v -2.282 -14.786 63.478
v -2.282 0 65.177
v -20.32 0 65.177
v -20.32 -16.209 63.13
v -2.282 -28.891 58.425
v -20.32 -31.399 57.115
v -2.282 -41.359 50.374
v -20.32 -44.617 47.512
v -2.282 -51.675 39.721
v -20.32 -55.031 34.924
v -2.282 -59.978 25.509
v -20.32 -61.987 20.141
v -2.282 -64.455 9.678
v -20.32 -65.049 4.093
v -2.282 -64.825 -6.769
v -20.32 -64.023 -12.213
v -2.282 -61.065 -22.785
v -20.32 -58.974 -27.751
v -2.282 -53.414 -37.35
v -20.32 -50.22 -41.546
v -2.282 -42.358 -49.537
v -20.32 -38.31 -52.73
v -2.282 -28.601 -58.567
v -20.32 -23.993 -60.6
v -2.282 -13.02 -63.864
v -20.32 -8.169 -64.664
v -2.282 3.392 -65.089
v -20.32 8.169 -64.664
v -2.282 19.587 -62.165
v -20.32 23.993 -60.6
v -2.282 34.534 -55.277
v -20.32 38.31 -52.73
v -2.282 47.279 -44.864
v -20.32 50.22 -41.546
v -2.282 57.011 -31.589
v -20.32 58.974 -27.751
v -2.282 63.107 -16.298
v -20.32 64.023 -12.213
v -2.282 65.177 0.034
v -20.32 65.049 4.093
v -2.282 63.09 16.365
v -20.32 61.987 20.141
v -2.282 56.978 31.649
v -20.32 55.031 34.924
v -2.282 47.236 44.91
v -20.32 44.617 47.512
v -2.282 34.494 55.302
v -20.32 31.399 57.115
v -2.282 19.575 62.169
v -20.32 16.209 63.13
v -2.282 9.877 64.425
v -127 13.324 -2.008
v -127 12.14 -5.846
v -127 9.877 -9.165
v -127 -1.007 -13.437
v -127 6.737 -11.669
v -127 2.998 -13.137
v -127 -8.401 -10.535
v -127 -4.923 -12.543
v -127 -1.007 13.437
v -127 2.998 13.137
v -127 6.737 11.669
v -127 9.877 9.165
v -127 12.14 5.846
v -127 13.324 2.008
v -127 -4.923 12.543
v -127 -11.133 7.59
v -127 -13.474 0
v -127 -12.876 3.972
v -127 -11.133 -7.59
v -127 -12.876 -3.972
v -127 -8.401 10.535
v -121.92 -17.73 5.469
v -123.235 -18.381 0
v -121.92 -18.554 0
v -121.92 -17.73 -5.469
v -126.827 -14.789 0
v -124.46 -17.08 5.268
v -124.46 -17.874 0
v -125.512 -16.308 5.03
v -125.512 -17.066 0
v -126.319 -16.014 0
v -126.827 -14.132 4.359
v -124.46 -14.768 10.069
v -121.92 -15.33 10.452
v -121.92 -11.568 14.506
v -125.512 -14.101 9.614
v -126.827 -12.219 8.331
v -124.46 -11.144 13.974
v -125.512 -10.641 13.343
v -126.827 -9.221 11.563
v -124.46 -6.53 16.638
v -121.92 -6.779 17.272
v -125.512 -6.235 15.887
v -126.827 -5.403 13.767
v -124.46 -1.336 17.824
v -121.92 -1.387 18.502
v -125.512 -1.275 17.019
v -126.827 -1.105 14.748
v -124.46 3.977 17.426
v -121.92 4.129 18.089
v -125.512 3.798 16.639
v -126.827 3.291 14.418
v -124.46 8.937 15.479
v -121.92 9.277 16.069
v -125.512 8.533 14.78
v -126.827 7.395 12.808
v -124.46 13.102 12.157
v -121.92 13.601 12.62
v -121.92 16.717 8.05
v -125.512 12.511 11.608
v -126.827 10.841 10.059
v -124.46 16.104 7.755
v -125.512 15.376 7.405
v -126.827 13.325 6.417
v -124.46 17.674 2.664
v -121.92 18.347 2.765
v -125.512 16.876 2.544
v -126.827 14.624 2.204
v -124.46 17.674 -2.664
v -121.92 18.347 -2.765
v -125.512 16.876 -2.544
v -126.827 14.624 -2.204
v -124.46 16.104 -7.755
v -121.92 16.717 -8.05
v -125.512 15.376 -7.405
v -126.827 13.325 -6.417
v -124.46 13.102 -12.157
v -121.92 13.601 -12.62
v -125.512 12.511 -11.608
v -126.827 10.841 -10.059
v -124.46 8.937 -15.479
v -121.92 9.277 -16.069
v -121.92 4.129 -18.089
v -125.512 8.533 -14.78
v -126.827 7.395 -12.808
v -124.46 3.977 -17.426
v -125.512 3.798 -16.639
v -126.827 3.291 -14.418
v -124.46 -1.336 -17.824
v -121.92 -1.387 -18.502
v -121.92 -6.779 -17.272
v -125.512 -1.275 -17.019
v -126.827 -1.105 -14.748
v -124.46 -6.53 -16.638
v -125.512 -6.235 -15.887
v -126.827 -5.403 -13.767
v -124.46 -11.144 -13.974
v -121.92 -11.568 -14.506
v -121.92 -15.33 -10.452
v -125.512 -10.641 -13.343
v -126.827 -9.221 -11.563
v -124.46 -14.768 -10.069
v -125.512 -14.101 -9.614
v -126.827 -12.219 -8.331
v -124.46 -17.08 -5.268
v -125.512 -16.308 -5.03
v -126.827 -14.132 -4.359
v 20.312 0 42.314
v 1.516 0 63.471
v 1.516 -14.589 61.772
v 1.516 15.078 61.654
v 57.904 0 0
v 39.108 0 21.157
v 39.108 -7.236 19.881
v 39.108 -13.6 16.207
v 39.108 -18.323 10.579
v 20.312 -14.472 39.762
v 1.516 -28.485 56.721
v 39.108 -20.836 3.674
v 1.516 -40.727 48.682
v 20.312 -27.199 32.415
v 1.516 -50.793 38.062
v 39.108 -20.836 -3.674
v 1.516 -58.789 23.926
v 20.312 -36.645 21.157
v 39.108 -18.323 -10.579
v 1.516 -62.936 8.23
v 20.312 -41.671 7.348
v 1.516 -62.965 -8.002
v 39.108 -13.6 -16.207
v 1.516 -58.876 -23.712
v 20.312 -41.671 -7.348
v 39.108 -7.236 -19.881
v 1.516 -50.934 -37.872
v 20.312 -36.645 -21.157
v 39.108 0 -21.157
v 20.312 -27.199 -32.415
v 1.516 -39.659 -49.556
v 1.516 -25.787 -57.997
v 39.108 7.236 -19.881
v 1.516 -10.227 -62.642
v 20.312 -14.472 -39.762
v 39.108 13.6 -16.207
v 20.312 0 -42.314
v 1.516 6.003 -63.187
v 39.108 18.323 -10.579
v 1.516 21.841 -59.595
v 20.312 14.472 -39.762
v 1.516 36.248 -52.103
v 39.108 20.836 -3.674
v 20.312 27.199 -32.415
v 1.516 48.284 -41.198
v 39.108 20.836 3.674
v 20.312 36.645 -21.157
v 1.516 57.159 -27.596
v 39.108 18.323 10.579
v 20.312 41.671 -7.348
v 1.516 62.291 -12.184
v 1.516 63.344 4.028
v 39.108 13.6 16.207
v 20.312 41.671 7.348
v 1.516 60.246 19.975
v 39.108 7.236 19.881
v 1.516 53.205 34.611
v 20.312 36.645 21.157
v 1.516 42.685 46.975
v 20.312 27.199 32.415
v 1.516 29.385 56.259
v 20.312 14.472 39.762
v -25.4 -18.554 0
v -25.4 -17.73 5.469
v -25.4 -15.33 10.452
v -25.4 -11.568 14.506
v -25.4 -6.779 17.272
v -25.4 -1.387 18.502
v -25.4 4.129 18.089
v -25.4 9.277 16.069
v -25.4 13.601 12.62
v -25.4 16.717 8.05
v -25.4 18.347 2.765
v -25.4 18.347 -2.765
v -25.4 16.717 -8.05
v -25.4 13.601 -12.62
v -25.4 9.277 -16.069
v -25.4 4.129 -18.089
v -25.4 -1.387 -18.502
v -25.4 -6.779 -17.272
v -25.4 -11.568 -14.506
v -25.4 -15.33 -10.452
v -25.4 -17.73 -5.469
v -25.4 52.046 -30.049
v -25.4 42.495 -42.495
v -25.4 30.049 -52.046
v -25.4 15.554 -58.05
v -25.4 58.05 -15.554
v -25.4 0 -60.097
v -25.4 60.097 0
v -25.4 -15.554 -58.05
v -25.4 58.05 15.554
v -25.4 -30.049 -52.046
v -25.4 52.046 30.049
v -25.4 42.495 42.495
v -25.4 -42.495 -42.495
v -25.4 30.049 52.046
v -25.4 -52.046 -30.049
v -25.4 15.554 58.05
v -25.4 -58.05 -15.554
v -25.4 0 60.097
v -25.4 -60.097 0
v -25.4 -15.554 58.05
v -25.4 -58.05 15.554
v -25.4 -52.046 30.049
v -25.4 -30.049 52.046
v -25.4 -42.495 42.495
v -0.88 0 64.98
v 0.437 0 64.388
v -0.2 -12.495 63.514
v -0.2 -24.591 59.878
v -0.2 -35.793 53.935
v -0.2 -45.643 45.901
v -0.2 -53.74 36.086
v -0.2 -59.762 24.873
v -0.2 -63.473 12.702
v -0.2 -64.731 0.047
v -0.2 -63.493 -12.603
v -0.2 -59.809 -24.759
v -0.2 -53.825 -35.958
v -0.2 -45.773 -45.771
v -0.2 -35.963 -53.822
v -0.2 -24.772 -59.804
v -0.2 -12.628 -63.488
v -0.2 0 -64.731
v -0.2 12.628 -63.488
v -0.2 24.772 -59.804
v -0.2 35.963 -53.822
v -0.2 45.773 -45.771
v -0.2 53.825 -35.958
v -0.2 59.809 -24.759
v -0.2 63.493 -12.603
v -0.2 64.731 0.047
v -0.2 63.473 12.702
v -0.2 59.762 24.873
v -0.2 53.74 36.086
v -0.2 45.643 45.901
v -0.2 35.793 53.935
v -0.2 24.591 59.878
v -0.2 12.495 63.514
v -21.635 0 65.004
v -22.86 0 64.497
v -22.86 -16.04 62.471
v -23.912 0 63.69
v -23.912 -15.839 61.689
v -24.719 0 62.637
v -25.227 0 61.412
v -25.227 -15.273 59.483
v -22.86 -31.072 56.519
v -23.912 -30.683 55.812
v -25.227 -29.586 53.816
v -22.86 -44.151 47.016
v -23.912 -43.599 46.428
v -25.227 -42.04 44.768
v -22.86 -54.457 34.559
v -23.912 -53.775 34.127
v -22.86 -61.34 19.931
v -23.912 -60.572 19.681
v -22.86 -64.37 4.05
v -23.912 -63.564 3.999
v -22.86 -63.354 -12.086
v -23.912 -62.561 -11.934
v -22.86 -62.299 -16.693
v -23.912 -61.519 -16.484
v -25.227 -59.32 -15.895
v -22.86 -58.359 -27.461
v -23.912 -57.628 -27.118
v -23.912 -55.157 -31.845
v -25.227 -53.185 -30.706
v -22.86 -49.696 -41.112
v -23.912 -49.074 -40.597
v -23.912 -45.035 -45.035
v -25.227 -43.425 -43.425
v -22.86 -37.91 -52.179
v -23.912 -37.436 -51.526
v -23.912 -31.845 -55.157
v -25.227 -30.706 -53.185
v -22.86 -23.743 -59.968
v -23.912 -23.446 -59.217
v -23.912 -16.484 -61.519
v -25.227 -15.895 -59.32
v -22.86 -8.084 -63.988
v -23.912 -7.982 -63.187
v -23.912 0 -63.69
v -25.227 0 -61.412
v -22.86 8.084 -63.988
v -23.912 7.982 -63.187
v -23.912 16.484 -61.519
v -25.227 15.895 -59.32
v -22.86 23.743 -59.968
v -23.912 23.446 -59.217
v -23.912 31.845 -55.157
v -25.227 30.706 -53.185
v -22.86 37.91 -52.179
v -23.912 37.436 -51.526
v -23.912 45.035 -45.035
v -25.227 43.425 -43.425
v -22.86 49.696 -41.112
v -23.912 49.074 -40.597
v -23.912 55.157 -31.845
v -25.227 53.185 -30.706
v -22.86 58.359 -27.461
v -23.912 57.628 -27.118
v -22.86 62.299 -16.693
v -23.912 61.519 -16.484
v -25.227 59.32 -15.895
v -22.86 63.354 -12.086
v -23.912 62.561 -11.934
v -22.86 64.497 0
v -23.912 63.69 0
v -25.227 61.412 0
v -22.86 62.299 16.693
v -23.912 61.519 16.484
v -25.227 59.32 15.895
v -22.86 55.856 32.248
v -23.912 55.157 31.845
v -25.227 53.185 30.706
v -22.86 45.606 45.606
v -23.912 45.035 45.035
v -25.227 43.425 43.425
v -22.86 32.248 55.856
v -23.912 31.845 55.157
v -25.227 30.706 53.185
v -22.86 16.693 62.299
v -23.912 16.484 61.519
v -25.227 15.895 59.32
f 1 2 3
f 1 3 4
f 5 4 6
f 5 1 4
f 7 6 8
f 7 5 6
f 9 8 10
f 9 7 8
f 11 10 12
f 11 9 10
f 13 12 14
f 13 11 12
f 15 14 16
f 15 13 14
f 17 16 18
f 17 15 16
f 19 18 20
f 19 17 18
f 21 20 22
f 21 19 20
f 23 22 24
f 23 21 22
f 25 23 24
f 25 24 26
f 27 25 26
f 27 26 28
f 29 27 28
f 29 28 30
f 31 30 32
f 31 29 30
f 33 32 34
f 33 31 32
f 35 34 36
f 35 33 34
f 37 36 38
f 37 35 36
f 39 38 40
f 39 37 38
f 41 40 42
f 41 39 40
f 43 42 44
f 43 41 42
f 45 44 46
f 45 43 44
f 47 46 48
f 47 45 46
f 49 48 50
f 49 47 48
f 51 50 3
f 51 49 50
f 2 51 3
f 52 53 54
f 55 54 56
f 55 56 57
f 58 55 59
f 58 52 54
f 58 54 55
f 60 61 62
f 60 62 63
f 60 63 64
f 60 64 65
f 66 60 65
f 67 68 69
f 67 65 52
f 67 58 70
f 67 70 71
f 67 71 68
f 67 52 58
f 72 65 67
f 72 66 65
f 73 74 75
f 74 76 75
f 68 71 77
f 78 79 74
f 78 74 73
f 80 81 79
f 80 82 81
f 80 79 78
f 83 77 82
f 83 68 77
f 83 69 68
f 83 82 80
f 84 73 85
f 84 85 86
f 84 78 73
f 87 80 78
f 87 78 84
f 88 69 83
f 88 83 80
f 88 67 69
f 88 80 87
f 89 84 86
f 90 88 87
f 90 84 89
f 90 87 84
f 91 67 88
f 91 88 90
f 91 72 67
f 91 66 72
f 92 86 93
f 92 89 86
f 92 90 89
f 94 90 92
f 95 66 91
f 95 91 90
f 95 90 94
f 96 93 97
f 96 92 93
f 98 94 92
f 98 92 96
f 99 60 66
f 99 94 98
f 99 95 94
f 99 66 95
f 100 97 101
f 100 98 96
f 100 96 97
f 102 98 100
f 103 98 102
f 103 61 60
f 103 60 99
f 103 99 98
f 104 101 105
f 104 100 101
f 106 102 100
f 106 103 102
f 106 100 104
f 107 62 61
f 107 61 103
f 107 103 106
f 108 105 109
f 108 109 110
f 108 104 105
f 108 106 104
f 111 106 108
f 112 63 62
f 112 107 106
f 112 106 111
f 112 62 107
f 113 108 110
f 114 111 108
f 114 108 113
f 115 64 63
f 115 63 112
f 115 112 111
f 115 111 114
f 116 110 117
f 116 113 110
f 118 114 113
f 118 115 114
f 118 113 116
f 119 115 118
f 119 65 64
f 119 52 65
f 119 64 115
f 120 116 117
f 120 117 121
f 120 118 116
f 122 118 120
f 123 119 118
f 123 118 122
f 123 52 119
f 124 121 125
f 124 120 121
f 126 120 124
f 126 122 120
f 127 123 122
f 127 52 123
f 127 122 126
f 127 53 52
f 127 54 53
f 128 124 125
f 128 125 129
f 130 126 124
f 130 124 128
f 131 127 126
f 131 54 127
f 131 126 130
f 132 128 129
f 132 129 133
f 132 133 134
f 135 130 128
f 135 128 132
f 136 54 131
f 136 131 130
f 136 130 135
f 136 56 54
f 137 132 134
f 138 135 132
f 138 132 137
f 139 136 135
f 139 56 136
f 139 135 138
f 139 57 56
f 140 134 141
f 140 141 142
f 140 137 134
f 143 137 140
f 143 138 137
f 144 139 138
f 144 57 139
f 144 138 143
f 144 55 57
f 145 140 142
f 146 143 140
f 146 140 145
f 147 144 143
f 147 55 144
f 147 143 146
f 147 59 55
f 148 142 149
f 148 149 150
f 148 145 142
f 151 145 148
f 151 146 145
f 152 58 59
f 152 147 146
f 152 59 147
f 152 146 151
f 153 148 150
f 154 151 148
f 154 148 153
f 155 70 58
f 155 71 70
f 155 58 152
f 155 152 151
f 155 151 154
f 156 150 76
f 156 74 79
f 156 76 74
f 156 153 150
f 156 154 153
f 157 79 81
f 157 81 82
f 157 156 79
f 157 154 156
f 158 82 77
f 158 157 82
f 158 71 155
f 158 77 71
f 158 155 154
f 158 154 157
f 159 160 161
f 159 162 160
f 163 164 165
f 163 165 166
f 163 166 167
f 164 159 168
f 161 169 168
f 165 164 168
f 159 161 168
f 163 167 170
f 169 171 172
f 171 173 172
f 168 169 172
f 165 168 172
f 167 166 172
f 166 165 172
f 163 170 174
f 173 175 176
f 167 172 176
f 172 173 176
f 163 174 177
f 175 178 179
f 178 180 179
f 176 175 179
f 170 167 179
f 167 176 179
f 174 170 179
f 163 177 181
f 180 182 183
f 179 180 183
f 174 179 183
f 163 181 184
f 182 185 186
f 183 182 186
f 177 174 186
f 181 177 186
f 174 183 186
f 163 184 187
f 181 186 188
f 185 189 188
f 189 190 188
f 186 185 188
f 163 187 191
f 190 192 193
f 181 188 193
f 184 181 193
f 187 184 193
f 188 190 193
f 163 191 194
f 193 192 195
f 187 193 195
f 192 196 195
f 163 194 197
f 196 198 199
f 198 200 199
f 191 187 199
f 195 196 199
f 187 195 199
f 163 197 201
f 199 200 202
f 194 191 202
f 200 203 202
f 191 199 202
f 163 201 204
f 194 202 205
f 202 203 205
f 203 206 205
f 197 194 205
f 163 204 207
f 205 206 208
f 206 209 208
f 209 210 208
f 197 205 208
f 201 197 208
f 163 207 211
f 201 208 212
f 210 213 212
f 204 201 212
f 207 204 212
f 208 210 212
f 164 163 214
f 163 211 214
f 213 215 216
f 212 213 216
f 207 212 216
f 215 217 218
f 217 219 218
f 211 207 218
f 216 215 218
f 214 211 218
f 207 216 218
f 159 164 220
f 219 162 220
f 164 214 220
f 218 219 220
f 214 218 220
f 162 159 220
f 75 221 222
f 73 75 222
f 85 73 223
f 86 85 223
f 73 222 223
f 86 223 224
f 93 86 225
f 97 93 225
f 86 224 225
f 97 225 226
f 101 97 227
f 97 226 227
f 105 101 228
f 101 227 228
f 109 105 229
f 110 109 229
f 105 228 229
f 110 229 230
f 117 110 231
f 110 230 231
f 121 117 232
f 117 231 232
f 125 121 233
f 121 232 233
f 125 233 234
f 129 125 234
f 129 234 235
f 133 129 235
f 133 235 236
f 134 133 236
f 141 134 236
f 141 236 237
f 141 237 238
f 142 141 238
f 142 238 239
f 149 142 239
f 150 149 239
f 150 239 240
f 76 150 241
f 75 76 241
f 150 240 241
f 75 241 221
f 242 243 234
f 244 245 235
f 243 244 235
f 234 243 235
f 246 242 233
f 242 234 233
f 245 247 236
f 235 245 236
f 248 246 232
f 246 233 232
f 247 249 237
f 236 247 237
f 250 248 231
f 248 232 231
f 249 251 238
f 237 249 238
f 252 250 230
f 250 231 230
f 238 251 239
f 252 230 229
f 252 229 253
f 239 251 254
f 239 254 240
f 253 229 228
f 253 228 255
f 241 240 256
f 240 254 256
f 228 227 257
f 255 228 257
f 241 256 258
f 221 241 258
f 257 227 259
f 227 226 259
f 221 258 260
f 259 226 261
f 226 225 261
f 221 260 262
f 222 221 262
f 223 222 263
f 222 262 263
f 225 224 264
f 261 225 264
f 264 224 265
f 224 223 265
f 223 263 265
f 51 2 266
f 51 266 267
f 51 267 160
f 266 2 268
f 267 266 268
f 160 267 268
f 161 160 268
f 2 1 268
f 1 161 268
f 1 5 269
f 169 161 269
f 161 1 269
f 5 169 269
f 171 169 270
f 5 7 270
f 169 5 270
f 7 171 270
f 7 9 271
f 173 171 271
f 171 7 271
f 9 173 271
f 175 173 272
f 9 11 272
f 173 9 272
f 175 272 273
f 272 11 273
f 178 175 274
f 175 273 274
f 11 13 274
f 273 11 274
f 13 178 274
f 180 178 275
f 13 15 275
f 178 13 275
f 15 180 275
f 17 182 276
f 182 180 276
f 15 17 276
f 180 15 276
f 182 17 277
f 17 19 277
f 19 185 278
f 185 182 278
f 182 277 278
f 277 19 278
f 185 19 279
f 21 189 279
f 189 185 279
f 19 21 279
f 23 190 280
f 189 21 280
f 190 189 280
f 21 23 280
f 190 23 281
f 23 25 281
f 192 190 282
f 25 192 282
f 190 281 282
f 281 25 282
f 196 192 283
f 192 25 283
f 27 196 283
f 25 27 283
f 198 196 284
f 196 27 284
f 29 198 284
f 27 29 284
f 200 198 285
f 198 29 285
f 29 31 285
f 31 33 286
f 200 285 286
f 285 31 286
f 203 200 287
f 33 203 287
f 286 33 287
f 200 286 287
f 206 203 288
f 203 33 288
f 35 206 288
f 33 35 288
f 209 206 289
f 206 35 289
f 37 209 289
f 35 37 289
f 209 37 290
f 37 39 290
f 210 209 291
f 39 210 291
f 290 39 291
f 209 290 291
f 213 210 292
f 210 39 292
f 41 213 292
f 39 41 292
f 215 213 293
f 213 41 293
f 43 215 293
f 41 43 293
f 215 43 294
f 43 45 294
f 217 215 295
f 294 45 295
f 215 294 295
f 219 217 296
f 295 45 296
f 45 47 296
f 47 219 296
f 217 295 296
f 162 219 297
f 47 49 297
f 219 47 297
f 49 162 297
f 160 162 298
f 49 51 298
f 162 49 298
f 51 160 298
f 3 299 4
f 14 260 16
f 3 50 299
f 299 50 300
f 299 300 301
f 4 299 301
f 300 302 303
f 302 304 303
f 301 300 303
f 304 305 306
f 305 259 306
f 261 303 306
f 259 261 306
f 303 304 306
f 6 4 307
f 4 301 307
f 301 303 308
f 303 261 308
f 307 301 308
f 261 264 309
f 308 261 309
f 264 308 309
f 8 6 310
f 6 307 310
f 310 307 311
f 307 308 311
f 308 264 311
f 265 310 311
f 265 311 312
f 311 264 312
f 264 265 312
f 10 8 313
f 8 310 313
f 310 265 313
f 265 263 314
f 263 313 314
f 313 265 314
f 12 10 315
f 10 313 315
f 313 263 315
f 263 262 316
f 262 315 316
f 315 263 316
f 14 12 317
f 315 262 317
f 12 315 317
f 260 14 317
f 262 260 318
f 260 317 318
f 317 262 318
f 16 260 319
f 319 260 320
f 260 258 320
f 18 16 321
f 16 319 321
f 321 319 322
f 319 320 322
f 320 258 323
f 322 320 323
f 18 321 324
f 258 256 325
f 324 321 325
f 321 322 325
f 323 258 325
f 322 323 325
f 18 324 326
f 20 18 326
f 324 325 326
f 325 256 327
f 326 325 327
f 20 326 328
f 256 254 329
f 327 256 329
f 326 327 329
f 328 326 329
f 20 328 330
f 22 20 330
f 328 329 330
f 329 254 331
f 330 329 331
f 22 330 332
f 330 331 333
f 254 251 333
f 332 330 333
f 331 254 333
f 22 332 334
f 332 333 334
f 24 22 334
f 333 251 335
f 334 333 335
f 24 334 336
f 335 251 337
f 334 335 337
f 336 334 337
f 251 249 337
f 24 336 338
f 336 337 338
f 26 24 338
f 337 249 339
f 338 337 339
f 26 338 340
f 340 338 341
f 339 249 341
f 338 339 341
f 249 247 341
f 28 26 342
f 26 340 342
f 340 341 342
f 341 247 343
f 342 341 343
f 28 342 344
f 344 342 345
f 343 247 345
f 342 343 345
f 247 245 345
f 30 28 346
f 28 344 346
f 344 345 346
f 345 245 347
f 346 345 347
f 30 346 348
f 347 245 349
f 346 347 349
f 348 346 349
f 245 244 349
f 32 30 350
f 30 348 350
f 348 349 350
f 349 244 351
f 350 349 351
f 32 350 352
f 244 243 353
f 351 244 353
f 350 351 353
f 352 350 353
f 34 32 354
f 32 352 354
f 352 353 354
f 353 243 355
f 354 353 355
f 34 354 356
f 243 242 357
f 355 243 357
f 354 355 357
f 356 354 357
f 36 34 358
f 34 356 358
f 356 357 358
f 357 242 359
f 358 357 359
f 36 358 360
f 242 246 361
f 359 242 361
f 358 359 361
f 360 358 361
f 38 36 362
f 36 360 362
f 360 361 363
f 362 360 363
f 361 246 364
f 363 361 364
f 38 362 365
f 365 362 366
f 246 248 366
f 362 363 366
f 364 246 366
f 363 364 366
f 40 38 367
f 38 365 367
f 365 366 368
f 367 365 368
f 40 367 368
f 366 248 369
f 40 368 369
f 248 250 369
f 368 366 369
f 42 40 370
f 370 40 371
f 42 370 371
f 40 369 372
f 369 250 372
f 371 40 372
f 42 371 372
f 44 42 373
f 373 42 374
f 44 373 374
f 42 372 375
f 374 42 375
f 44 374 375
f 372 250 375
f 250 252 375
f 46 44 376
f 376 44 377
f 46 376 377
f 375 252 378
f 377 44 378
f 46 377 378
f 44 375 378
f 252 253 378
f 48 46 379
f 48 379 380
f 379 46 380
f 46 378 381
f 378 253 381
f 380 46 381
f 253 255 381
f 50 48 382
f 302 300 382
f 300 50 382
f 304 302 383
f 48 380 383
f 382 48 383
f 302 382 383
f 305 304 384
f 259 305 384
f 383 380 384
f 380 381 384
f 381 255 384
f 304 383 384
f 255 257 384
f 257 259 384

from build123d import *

# Parameters (mm, degrees)
F2_DEPTH = 25.4
F3_R     = 18.5543497172
F4_DEPTH = 101.6
F5_R     = 5.08
F6_R     = 5.08
F7_R     = 5.08


with BuildPart() as f1:
    # F0 (on Front) → F1 (revolve)
    with BuildSketch(Plane.XZ):
        Polygon((0, 65.1774853468), (0, 0), (57.9038485885, 0), align=None)
    revolve(axis=Axis((28.9519242942, 0, 0), (1, 0, 0)))

    # F2 (add): a face of the model
    f2_faces = [f1.faces().sort_by_distance(p)[0] for p in [
        (0, 0, 0),
    ]]
    extrude(f2_faces, amount=F2_DEPTH)

    # F3 (on face) → F4 (join)
    with BuildSketch(Plane(origin=(-25.4, 0, 0), x_dir=(0, -1, 0), z_dir=(-1, 0, 0))):
        Circle(F3_R)
    extrude(amount=F4_DEPTH)

    # F5
    f5_edges = [f1.edges().sort_by_distance(p)[0] for p in [
        (0, 0, -65.177485),
    ]]
    fillet(f5_edges, radius=F5_R)

    # F6
    f6_edges = [f1.edges().sort_by_distance(p)[0] for p in [
        (-25.4, 0, -65.177485),
    ]]
    fillet(f6_edges, radius=F6_R)

    # F7
    f7_edges = [f1.edges().sort_by_distance(p)[0] for p in [
        (-127, 18.55435, 0),
    ]]
    fillet(f7_edges, radius=F7_R)


solid = f1.part
